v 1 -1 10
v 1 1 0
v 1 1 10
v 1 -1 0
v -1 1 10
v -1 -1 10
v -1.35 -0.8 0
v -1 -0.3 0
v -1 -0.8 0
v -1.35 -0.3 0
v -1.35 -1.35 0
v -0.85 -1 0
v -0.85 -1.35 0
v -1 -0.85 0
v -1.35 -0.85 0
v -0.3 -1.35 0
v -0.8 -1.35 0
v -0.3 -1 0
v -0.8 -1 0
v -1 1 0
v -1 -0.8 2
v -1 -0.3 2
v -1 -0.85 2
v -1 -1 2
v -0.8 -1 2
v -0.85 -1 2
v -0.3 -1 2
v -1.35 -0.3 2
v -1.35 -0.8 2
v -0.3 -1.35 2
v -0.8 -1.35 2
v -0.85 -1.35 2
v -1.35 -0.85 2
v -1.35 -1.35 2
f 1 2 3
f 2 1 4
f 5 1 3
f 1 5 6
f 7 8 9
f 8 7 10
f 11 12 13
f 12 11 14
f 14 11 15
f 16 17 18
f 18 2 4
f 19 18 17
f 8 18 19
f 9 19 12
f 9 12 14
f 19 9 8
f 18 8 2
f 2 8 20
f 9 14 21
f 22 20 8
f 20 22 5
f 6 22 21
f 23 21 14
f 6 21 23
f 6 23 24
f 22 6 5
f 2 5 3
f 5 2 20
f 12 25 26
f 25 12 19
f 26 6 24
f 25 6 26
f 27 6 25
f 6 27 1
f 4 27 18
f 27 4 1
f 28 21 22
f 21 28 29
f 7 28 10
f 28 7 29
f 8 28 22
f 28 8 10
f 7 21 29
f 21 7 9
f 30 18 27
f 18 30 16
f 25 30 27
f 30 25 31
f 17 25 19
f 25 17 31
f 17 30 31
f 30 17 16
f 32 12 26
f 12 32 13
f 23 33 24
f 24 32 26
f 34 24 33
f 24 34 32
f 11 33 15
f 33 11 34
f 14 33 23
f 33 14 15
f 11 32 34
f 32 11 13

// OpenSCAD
translate([0, 0, 5]) color([0,1,0,0.9]) cube([2, 2, 10], center=true);
translate([-0.55, -0.55, 1]) color([1,0,0]) cube([0.5, 0.5, 2], center=true);
translate([-1.1, -0.55, 1]) color([1,0,0]) cube([0.5, 0.5, 2], center=true);
translate([-0.55, -1.1, 1]) color([1,0,0]) cube([0.5, 0.5, 2], center=true);
translate([-1.1, -1.1, 1]) color([1,0,0]) cube([0.5, 0.5, 2], center=true);
